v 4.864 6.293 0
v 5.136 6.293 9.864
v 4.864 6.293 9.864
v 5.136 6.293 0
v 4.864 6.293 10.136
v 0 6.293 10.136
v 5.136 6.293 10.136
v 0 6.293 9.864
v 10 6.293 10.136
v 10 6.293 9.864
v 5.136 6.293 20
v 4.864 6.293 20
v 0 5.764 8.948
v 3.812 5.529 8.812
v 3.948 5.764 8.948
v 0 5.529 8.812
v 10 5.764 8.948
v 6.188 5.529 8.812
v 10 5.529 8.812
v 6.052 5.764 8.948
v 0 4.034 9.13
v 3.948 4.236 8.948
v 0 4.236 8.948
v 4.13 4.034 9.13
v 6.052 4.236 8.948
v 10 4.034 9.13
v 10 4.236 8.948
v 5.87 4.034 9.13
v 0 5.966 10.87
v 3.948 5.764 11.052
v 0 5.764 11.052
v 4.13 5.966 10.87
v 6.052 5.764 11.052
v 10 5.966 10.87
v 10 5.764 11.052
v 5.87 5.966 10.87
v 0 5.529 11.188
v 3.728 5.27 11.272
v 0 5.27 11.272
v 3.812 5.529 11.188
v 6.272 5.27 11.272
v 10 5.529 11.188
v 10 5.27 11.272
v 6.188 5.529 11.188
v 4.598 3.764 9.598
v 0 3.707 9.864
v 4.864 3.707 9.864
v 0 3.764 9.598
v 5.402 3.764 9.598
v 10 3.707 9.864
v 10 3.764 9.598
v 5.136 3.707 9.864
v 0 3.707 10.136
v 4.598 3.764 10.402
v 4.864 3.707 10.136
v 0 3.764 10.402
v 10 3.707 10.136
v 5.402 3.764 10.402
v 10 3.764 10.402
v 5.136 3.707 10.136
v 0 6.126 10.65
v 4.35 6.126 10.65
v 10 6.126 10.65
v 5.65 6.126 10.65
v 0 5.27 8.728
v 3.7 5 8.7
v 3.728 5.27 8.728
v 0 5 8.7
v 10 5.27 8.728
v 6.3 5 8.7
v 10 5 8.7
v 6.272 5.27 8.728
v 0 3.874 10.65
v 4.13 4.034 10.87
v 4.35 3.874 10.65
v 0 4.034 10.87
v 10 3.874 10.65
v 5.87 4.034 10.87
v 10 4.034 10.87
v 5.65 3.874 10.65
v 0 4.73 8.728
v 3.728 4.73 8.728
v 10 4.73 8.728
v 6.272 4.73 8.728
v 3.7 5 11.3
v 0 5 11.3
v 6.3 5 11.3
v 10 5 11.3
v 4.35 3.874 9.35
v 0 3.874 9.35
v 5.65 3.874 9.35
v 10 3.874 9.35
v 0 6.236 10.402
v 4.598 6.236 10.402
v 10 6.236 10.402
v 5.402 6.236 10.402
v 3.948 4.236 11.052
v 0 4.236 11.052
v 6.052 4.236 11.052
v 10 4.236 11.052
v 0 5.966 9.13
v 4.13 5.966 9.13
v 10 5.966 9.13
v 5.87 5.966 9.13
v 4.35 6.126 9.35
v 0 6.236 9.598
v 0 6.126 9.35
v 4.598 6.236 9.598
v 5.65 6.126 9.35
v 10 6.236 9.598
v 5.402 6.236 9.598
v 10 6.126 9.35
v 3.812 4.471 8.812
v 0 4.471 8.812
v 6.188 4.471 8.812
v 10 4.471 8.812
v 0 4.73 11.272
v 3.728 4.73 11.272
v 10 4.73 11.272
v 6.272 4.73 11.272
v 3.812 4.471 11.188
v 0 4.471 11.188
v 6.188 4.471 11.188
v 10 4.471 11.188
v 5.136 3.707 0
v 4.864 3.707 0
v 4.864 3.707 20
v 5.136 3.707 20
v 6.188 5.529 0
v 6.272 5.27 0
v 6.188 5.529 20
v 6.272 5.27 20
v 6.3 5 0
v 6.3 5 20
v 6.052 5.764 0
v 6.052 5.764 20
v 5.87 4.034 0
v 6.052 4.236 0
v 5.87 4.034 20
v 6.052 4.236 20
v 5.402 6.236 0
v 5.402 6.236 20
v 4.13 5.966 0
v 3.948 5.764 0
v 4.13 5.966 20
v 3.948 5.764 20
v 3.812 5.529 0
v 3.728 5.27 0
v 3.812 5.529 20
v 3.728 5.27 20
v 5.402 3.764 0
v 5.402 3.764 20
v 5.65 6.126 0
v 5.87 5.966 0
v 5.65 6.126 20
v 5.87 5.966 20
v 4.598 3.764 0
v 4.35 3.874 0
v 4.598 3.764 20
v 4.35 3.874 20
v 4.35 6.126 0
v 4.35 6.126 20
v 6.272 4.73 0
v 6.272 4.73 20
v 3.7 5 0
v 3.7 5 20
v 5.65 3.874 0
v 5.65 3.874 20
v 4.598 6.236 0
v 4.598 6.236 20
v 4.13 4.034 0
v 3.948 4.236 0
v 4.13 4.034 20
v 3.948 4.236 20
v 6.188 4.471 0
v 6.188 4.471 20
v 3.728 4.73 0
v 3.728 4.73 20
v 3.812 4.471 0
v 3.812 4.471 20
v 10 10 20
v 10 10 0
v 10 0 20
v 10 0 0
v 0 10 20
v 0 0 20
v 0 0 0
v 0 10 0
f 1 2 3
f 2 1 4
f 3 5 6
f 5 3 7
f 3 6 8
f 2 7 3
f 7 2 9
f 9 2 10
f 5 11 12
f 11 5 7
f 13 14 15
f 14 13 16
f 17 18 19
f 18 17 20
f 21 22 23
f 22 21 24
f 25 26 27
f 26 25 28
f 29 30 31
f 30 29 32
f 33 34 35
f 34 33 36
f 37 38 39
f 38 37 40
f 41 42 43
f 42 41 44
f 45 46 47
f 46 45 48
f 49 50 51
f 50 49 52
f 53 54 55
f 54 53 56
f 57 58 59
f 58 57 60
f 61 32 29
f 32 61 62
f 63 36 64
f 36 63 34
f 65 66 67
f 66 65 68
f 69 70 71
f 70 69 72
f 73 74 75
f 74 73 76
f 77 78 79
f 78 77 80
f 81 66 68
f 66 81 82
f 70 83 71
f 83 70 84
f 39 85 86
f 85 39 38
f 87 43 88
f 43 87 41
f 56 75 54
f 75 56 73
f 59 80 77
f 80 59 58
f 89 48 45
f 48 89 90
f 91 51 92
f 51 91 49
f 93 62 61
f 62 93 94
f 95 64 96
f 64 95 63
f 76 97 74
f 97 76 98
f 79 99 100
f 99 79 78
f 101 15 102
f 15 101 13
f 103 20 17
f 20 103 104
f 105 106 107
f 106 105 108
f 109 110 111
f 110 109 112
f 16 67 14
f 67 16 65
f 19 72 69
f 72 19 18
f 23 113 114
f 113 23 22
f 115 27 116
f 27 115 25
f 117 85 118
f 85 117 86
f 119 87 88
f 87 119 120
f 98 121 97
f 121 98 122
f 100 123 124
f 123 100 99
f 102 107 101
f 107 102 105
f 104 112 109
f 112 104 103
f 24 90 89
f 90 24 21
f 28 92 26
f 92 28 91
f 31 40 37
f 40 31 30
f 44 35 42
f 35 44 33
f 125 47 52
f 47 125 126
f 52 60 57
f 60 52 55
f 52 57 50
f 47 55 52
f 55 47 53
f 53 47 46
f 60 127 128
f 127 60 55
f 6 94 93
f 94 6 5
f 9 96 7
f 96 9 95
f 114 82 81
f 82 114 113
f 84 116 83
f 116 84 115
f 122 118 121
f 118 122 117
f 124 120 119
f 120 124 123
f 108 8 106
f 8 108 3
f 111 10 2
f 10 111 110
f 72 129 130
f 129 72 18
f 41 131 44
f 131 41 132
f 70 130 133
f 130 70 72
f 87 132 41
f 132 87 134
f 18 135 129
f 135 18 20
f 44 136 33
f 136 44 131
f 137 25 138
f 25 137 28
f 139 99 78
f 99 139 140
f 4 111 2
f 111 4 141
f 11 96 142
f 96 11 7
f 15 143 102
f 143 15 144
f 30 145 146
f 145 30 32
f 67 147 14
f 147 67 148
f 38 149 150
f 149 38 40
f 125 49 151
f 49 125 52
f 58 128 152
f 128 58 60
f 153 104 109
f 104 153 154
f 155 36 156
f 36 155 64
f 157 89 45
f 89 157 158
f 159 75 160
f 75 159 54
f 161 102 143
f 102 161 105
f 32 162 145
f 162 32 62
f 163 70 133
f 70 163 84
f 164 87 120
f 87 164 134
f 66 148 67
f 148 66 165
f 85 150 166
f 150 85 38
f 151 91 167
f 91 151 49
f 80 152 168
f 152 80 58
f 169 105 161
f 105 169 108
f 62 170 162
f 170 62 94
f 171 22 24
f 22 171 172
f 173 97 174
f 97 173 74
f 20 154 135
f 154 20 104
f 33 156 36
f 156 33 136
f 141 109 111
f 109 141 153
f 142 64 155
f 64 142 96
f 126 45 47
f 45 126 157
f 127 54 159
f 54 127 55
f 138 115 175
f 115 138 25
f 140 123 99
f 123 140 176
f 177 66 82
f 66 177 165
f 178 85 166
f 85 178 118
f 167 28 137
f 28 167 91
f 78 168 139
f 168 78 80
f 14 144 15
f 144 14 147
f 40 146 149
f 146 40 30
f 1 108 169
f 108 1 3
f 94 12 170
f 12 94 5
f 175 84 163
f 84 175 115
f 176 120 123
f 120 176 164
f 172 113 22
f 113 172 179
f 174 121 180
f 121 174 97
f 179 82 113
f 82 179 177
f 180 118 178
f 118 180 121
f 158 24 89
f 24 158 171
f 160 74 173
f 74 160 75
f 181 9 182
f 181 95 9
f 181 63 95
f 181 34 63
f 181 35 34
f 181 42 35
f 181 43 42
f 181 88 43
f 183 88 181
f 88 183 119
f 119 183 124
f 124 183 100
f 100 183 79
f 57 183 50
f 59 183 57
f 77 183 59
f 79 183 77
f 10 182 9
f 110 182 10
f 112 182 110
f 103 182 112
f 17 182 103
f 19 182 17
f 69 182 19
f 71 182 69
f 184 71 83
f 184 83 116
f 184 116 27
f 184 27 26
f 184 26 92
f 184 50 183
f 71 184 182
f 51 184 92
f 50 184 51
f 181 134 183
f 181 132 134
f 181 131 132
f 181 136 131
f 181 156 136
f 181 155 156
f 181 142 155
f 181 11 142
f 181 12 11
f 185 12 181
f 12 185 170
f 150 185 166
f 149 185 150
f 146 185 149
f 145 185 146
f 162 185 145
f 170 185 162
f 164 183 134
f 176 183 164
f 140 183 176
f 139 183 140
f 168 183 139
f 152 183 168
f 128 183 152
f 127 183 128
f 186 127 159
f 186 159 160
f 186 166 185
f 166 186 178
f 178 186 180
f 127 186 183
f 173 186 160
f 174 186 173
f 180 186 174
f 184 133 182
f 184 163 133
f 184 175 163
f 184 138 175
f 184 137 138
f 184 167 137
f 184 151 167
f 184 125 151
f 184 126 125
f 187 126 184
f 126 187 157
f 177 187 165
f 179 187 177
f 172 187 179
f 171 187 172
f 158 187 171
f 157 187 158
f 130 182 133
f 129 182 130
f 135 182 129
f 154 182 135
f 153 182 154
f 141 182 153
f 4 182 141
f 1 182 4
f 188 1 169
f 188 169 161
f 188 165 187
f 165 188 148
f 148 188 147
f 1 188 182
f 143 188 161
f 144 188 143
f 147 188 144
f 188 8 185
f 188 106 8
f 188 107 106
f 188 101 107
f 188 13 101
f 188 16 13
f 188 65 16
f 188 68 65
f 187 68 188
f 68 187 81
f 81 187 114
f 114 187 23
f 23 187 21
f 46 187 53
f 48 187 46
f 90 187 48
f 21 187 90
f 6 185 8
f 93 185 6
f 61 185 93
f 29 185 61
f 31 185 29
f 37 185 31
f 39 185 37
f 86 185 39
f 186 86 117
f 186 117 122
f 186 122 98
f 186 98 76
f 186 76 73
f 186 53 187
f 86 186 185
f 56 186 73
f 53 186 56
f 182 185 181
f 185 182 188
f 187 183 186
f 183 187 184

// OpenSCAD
difference(){
	union(){        
        translate([0,0,0]){
           cube([10,10,20], center=false);
        }
	

        
	}
	union() {
        
    // schroefdraad
            translate([-10,5,10]){
                rotate(a = [0,90,0]) {
                    cylinder(h=400, r=1.3, $fn=30, center=false);
                }
            }	
        
        // montage gaten
        
        translate([5,5,-10]){
            rotate(a = [0,0,0]) {
                cylinder(h=400, r=1.3, $fn=30, center=false);
            }
        }	

	


	}
}
